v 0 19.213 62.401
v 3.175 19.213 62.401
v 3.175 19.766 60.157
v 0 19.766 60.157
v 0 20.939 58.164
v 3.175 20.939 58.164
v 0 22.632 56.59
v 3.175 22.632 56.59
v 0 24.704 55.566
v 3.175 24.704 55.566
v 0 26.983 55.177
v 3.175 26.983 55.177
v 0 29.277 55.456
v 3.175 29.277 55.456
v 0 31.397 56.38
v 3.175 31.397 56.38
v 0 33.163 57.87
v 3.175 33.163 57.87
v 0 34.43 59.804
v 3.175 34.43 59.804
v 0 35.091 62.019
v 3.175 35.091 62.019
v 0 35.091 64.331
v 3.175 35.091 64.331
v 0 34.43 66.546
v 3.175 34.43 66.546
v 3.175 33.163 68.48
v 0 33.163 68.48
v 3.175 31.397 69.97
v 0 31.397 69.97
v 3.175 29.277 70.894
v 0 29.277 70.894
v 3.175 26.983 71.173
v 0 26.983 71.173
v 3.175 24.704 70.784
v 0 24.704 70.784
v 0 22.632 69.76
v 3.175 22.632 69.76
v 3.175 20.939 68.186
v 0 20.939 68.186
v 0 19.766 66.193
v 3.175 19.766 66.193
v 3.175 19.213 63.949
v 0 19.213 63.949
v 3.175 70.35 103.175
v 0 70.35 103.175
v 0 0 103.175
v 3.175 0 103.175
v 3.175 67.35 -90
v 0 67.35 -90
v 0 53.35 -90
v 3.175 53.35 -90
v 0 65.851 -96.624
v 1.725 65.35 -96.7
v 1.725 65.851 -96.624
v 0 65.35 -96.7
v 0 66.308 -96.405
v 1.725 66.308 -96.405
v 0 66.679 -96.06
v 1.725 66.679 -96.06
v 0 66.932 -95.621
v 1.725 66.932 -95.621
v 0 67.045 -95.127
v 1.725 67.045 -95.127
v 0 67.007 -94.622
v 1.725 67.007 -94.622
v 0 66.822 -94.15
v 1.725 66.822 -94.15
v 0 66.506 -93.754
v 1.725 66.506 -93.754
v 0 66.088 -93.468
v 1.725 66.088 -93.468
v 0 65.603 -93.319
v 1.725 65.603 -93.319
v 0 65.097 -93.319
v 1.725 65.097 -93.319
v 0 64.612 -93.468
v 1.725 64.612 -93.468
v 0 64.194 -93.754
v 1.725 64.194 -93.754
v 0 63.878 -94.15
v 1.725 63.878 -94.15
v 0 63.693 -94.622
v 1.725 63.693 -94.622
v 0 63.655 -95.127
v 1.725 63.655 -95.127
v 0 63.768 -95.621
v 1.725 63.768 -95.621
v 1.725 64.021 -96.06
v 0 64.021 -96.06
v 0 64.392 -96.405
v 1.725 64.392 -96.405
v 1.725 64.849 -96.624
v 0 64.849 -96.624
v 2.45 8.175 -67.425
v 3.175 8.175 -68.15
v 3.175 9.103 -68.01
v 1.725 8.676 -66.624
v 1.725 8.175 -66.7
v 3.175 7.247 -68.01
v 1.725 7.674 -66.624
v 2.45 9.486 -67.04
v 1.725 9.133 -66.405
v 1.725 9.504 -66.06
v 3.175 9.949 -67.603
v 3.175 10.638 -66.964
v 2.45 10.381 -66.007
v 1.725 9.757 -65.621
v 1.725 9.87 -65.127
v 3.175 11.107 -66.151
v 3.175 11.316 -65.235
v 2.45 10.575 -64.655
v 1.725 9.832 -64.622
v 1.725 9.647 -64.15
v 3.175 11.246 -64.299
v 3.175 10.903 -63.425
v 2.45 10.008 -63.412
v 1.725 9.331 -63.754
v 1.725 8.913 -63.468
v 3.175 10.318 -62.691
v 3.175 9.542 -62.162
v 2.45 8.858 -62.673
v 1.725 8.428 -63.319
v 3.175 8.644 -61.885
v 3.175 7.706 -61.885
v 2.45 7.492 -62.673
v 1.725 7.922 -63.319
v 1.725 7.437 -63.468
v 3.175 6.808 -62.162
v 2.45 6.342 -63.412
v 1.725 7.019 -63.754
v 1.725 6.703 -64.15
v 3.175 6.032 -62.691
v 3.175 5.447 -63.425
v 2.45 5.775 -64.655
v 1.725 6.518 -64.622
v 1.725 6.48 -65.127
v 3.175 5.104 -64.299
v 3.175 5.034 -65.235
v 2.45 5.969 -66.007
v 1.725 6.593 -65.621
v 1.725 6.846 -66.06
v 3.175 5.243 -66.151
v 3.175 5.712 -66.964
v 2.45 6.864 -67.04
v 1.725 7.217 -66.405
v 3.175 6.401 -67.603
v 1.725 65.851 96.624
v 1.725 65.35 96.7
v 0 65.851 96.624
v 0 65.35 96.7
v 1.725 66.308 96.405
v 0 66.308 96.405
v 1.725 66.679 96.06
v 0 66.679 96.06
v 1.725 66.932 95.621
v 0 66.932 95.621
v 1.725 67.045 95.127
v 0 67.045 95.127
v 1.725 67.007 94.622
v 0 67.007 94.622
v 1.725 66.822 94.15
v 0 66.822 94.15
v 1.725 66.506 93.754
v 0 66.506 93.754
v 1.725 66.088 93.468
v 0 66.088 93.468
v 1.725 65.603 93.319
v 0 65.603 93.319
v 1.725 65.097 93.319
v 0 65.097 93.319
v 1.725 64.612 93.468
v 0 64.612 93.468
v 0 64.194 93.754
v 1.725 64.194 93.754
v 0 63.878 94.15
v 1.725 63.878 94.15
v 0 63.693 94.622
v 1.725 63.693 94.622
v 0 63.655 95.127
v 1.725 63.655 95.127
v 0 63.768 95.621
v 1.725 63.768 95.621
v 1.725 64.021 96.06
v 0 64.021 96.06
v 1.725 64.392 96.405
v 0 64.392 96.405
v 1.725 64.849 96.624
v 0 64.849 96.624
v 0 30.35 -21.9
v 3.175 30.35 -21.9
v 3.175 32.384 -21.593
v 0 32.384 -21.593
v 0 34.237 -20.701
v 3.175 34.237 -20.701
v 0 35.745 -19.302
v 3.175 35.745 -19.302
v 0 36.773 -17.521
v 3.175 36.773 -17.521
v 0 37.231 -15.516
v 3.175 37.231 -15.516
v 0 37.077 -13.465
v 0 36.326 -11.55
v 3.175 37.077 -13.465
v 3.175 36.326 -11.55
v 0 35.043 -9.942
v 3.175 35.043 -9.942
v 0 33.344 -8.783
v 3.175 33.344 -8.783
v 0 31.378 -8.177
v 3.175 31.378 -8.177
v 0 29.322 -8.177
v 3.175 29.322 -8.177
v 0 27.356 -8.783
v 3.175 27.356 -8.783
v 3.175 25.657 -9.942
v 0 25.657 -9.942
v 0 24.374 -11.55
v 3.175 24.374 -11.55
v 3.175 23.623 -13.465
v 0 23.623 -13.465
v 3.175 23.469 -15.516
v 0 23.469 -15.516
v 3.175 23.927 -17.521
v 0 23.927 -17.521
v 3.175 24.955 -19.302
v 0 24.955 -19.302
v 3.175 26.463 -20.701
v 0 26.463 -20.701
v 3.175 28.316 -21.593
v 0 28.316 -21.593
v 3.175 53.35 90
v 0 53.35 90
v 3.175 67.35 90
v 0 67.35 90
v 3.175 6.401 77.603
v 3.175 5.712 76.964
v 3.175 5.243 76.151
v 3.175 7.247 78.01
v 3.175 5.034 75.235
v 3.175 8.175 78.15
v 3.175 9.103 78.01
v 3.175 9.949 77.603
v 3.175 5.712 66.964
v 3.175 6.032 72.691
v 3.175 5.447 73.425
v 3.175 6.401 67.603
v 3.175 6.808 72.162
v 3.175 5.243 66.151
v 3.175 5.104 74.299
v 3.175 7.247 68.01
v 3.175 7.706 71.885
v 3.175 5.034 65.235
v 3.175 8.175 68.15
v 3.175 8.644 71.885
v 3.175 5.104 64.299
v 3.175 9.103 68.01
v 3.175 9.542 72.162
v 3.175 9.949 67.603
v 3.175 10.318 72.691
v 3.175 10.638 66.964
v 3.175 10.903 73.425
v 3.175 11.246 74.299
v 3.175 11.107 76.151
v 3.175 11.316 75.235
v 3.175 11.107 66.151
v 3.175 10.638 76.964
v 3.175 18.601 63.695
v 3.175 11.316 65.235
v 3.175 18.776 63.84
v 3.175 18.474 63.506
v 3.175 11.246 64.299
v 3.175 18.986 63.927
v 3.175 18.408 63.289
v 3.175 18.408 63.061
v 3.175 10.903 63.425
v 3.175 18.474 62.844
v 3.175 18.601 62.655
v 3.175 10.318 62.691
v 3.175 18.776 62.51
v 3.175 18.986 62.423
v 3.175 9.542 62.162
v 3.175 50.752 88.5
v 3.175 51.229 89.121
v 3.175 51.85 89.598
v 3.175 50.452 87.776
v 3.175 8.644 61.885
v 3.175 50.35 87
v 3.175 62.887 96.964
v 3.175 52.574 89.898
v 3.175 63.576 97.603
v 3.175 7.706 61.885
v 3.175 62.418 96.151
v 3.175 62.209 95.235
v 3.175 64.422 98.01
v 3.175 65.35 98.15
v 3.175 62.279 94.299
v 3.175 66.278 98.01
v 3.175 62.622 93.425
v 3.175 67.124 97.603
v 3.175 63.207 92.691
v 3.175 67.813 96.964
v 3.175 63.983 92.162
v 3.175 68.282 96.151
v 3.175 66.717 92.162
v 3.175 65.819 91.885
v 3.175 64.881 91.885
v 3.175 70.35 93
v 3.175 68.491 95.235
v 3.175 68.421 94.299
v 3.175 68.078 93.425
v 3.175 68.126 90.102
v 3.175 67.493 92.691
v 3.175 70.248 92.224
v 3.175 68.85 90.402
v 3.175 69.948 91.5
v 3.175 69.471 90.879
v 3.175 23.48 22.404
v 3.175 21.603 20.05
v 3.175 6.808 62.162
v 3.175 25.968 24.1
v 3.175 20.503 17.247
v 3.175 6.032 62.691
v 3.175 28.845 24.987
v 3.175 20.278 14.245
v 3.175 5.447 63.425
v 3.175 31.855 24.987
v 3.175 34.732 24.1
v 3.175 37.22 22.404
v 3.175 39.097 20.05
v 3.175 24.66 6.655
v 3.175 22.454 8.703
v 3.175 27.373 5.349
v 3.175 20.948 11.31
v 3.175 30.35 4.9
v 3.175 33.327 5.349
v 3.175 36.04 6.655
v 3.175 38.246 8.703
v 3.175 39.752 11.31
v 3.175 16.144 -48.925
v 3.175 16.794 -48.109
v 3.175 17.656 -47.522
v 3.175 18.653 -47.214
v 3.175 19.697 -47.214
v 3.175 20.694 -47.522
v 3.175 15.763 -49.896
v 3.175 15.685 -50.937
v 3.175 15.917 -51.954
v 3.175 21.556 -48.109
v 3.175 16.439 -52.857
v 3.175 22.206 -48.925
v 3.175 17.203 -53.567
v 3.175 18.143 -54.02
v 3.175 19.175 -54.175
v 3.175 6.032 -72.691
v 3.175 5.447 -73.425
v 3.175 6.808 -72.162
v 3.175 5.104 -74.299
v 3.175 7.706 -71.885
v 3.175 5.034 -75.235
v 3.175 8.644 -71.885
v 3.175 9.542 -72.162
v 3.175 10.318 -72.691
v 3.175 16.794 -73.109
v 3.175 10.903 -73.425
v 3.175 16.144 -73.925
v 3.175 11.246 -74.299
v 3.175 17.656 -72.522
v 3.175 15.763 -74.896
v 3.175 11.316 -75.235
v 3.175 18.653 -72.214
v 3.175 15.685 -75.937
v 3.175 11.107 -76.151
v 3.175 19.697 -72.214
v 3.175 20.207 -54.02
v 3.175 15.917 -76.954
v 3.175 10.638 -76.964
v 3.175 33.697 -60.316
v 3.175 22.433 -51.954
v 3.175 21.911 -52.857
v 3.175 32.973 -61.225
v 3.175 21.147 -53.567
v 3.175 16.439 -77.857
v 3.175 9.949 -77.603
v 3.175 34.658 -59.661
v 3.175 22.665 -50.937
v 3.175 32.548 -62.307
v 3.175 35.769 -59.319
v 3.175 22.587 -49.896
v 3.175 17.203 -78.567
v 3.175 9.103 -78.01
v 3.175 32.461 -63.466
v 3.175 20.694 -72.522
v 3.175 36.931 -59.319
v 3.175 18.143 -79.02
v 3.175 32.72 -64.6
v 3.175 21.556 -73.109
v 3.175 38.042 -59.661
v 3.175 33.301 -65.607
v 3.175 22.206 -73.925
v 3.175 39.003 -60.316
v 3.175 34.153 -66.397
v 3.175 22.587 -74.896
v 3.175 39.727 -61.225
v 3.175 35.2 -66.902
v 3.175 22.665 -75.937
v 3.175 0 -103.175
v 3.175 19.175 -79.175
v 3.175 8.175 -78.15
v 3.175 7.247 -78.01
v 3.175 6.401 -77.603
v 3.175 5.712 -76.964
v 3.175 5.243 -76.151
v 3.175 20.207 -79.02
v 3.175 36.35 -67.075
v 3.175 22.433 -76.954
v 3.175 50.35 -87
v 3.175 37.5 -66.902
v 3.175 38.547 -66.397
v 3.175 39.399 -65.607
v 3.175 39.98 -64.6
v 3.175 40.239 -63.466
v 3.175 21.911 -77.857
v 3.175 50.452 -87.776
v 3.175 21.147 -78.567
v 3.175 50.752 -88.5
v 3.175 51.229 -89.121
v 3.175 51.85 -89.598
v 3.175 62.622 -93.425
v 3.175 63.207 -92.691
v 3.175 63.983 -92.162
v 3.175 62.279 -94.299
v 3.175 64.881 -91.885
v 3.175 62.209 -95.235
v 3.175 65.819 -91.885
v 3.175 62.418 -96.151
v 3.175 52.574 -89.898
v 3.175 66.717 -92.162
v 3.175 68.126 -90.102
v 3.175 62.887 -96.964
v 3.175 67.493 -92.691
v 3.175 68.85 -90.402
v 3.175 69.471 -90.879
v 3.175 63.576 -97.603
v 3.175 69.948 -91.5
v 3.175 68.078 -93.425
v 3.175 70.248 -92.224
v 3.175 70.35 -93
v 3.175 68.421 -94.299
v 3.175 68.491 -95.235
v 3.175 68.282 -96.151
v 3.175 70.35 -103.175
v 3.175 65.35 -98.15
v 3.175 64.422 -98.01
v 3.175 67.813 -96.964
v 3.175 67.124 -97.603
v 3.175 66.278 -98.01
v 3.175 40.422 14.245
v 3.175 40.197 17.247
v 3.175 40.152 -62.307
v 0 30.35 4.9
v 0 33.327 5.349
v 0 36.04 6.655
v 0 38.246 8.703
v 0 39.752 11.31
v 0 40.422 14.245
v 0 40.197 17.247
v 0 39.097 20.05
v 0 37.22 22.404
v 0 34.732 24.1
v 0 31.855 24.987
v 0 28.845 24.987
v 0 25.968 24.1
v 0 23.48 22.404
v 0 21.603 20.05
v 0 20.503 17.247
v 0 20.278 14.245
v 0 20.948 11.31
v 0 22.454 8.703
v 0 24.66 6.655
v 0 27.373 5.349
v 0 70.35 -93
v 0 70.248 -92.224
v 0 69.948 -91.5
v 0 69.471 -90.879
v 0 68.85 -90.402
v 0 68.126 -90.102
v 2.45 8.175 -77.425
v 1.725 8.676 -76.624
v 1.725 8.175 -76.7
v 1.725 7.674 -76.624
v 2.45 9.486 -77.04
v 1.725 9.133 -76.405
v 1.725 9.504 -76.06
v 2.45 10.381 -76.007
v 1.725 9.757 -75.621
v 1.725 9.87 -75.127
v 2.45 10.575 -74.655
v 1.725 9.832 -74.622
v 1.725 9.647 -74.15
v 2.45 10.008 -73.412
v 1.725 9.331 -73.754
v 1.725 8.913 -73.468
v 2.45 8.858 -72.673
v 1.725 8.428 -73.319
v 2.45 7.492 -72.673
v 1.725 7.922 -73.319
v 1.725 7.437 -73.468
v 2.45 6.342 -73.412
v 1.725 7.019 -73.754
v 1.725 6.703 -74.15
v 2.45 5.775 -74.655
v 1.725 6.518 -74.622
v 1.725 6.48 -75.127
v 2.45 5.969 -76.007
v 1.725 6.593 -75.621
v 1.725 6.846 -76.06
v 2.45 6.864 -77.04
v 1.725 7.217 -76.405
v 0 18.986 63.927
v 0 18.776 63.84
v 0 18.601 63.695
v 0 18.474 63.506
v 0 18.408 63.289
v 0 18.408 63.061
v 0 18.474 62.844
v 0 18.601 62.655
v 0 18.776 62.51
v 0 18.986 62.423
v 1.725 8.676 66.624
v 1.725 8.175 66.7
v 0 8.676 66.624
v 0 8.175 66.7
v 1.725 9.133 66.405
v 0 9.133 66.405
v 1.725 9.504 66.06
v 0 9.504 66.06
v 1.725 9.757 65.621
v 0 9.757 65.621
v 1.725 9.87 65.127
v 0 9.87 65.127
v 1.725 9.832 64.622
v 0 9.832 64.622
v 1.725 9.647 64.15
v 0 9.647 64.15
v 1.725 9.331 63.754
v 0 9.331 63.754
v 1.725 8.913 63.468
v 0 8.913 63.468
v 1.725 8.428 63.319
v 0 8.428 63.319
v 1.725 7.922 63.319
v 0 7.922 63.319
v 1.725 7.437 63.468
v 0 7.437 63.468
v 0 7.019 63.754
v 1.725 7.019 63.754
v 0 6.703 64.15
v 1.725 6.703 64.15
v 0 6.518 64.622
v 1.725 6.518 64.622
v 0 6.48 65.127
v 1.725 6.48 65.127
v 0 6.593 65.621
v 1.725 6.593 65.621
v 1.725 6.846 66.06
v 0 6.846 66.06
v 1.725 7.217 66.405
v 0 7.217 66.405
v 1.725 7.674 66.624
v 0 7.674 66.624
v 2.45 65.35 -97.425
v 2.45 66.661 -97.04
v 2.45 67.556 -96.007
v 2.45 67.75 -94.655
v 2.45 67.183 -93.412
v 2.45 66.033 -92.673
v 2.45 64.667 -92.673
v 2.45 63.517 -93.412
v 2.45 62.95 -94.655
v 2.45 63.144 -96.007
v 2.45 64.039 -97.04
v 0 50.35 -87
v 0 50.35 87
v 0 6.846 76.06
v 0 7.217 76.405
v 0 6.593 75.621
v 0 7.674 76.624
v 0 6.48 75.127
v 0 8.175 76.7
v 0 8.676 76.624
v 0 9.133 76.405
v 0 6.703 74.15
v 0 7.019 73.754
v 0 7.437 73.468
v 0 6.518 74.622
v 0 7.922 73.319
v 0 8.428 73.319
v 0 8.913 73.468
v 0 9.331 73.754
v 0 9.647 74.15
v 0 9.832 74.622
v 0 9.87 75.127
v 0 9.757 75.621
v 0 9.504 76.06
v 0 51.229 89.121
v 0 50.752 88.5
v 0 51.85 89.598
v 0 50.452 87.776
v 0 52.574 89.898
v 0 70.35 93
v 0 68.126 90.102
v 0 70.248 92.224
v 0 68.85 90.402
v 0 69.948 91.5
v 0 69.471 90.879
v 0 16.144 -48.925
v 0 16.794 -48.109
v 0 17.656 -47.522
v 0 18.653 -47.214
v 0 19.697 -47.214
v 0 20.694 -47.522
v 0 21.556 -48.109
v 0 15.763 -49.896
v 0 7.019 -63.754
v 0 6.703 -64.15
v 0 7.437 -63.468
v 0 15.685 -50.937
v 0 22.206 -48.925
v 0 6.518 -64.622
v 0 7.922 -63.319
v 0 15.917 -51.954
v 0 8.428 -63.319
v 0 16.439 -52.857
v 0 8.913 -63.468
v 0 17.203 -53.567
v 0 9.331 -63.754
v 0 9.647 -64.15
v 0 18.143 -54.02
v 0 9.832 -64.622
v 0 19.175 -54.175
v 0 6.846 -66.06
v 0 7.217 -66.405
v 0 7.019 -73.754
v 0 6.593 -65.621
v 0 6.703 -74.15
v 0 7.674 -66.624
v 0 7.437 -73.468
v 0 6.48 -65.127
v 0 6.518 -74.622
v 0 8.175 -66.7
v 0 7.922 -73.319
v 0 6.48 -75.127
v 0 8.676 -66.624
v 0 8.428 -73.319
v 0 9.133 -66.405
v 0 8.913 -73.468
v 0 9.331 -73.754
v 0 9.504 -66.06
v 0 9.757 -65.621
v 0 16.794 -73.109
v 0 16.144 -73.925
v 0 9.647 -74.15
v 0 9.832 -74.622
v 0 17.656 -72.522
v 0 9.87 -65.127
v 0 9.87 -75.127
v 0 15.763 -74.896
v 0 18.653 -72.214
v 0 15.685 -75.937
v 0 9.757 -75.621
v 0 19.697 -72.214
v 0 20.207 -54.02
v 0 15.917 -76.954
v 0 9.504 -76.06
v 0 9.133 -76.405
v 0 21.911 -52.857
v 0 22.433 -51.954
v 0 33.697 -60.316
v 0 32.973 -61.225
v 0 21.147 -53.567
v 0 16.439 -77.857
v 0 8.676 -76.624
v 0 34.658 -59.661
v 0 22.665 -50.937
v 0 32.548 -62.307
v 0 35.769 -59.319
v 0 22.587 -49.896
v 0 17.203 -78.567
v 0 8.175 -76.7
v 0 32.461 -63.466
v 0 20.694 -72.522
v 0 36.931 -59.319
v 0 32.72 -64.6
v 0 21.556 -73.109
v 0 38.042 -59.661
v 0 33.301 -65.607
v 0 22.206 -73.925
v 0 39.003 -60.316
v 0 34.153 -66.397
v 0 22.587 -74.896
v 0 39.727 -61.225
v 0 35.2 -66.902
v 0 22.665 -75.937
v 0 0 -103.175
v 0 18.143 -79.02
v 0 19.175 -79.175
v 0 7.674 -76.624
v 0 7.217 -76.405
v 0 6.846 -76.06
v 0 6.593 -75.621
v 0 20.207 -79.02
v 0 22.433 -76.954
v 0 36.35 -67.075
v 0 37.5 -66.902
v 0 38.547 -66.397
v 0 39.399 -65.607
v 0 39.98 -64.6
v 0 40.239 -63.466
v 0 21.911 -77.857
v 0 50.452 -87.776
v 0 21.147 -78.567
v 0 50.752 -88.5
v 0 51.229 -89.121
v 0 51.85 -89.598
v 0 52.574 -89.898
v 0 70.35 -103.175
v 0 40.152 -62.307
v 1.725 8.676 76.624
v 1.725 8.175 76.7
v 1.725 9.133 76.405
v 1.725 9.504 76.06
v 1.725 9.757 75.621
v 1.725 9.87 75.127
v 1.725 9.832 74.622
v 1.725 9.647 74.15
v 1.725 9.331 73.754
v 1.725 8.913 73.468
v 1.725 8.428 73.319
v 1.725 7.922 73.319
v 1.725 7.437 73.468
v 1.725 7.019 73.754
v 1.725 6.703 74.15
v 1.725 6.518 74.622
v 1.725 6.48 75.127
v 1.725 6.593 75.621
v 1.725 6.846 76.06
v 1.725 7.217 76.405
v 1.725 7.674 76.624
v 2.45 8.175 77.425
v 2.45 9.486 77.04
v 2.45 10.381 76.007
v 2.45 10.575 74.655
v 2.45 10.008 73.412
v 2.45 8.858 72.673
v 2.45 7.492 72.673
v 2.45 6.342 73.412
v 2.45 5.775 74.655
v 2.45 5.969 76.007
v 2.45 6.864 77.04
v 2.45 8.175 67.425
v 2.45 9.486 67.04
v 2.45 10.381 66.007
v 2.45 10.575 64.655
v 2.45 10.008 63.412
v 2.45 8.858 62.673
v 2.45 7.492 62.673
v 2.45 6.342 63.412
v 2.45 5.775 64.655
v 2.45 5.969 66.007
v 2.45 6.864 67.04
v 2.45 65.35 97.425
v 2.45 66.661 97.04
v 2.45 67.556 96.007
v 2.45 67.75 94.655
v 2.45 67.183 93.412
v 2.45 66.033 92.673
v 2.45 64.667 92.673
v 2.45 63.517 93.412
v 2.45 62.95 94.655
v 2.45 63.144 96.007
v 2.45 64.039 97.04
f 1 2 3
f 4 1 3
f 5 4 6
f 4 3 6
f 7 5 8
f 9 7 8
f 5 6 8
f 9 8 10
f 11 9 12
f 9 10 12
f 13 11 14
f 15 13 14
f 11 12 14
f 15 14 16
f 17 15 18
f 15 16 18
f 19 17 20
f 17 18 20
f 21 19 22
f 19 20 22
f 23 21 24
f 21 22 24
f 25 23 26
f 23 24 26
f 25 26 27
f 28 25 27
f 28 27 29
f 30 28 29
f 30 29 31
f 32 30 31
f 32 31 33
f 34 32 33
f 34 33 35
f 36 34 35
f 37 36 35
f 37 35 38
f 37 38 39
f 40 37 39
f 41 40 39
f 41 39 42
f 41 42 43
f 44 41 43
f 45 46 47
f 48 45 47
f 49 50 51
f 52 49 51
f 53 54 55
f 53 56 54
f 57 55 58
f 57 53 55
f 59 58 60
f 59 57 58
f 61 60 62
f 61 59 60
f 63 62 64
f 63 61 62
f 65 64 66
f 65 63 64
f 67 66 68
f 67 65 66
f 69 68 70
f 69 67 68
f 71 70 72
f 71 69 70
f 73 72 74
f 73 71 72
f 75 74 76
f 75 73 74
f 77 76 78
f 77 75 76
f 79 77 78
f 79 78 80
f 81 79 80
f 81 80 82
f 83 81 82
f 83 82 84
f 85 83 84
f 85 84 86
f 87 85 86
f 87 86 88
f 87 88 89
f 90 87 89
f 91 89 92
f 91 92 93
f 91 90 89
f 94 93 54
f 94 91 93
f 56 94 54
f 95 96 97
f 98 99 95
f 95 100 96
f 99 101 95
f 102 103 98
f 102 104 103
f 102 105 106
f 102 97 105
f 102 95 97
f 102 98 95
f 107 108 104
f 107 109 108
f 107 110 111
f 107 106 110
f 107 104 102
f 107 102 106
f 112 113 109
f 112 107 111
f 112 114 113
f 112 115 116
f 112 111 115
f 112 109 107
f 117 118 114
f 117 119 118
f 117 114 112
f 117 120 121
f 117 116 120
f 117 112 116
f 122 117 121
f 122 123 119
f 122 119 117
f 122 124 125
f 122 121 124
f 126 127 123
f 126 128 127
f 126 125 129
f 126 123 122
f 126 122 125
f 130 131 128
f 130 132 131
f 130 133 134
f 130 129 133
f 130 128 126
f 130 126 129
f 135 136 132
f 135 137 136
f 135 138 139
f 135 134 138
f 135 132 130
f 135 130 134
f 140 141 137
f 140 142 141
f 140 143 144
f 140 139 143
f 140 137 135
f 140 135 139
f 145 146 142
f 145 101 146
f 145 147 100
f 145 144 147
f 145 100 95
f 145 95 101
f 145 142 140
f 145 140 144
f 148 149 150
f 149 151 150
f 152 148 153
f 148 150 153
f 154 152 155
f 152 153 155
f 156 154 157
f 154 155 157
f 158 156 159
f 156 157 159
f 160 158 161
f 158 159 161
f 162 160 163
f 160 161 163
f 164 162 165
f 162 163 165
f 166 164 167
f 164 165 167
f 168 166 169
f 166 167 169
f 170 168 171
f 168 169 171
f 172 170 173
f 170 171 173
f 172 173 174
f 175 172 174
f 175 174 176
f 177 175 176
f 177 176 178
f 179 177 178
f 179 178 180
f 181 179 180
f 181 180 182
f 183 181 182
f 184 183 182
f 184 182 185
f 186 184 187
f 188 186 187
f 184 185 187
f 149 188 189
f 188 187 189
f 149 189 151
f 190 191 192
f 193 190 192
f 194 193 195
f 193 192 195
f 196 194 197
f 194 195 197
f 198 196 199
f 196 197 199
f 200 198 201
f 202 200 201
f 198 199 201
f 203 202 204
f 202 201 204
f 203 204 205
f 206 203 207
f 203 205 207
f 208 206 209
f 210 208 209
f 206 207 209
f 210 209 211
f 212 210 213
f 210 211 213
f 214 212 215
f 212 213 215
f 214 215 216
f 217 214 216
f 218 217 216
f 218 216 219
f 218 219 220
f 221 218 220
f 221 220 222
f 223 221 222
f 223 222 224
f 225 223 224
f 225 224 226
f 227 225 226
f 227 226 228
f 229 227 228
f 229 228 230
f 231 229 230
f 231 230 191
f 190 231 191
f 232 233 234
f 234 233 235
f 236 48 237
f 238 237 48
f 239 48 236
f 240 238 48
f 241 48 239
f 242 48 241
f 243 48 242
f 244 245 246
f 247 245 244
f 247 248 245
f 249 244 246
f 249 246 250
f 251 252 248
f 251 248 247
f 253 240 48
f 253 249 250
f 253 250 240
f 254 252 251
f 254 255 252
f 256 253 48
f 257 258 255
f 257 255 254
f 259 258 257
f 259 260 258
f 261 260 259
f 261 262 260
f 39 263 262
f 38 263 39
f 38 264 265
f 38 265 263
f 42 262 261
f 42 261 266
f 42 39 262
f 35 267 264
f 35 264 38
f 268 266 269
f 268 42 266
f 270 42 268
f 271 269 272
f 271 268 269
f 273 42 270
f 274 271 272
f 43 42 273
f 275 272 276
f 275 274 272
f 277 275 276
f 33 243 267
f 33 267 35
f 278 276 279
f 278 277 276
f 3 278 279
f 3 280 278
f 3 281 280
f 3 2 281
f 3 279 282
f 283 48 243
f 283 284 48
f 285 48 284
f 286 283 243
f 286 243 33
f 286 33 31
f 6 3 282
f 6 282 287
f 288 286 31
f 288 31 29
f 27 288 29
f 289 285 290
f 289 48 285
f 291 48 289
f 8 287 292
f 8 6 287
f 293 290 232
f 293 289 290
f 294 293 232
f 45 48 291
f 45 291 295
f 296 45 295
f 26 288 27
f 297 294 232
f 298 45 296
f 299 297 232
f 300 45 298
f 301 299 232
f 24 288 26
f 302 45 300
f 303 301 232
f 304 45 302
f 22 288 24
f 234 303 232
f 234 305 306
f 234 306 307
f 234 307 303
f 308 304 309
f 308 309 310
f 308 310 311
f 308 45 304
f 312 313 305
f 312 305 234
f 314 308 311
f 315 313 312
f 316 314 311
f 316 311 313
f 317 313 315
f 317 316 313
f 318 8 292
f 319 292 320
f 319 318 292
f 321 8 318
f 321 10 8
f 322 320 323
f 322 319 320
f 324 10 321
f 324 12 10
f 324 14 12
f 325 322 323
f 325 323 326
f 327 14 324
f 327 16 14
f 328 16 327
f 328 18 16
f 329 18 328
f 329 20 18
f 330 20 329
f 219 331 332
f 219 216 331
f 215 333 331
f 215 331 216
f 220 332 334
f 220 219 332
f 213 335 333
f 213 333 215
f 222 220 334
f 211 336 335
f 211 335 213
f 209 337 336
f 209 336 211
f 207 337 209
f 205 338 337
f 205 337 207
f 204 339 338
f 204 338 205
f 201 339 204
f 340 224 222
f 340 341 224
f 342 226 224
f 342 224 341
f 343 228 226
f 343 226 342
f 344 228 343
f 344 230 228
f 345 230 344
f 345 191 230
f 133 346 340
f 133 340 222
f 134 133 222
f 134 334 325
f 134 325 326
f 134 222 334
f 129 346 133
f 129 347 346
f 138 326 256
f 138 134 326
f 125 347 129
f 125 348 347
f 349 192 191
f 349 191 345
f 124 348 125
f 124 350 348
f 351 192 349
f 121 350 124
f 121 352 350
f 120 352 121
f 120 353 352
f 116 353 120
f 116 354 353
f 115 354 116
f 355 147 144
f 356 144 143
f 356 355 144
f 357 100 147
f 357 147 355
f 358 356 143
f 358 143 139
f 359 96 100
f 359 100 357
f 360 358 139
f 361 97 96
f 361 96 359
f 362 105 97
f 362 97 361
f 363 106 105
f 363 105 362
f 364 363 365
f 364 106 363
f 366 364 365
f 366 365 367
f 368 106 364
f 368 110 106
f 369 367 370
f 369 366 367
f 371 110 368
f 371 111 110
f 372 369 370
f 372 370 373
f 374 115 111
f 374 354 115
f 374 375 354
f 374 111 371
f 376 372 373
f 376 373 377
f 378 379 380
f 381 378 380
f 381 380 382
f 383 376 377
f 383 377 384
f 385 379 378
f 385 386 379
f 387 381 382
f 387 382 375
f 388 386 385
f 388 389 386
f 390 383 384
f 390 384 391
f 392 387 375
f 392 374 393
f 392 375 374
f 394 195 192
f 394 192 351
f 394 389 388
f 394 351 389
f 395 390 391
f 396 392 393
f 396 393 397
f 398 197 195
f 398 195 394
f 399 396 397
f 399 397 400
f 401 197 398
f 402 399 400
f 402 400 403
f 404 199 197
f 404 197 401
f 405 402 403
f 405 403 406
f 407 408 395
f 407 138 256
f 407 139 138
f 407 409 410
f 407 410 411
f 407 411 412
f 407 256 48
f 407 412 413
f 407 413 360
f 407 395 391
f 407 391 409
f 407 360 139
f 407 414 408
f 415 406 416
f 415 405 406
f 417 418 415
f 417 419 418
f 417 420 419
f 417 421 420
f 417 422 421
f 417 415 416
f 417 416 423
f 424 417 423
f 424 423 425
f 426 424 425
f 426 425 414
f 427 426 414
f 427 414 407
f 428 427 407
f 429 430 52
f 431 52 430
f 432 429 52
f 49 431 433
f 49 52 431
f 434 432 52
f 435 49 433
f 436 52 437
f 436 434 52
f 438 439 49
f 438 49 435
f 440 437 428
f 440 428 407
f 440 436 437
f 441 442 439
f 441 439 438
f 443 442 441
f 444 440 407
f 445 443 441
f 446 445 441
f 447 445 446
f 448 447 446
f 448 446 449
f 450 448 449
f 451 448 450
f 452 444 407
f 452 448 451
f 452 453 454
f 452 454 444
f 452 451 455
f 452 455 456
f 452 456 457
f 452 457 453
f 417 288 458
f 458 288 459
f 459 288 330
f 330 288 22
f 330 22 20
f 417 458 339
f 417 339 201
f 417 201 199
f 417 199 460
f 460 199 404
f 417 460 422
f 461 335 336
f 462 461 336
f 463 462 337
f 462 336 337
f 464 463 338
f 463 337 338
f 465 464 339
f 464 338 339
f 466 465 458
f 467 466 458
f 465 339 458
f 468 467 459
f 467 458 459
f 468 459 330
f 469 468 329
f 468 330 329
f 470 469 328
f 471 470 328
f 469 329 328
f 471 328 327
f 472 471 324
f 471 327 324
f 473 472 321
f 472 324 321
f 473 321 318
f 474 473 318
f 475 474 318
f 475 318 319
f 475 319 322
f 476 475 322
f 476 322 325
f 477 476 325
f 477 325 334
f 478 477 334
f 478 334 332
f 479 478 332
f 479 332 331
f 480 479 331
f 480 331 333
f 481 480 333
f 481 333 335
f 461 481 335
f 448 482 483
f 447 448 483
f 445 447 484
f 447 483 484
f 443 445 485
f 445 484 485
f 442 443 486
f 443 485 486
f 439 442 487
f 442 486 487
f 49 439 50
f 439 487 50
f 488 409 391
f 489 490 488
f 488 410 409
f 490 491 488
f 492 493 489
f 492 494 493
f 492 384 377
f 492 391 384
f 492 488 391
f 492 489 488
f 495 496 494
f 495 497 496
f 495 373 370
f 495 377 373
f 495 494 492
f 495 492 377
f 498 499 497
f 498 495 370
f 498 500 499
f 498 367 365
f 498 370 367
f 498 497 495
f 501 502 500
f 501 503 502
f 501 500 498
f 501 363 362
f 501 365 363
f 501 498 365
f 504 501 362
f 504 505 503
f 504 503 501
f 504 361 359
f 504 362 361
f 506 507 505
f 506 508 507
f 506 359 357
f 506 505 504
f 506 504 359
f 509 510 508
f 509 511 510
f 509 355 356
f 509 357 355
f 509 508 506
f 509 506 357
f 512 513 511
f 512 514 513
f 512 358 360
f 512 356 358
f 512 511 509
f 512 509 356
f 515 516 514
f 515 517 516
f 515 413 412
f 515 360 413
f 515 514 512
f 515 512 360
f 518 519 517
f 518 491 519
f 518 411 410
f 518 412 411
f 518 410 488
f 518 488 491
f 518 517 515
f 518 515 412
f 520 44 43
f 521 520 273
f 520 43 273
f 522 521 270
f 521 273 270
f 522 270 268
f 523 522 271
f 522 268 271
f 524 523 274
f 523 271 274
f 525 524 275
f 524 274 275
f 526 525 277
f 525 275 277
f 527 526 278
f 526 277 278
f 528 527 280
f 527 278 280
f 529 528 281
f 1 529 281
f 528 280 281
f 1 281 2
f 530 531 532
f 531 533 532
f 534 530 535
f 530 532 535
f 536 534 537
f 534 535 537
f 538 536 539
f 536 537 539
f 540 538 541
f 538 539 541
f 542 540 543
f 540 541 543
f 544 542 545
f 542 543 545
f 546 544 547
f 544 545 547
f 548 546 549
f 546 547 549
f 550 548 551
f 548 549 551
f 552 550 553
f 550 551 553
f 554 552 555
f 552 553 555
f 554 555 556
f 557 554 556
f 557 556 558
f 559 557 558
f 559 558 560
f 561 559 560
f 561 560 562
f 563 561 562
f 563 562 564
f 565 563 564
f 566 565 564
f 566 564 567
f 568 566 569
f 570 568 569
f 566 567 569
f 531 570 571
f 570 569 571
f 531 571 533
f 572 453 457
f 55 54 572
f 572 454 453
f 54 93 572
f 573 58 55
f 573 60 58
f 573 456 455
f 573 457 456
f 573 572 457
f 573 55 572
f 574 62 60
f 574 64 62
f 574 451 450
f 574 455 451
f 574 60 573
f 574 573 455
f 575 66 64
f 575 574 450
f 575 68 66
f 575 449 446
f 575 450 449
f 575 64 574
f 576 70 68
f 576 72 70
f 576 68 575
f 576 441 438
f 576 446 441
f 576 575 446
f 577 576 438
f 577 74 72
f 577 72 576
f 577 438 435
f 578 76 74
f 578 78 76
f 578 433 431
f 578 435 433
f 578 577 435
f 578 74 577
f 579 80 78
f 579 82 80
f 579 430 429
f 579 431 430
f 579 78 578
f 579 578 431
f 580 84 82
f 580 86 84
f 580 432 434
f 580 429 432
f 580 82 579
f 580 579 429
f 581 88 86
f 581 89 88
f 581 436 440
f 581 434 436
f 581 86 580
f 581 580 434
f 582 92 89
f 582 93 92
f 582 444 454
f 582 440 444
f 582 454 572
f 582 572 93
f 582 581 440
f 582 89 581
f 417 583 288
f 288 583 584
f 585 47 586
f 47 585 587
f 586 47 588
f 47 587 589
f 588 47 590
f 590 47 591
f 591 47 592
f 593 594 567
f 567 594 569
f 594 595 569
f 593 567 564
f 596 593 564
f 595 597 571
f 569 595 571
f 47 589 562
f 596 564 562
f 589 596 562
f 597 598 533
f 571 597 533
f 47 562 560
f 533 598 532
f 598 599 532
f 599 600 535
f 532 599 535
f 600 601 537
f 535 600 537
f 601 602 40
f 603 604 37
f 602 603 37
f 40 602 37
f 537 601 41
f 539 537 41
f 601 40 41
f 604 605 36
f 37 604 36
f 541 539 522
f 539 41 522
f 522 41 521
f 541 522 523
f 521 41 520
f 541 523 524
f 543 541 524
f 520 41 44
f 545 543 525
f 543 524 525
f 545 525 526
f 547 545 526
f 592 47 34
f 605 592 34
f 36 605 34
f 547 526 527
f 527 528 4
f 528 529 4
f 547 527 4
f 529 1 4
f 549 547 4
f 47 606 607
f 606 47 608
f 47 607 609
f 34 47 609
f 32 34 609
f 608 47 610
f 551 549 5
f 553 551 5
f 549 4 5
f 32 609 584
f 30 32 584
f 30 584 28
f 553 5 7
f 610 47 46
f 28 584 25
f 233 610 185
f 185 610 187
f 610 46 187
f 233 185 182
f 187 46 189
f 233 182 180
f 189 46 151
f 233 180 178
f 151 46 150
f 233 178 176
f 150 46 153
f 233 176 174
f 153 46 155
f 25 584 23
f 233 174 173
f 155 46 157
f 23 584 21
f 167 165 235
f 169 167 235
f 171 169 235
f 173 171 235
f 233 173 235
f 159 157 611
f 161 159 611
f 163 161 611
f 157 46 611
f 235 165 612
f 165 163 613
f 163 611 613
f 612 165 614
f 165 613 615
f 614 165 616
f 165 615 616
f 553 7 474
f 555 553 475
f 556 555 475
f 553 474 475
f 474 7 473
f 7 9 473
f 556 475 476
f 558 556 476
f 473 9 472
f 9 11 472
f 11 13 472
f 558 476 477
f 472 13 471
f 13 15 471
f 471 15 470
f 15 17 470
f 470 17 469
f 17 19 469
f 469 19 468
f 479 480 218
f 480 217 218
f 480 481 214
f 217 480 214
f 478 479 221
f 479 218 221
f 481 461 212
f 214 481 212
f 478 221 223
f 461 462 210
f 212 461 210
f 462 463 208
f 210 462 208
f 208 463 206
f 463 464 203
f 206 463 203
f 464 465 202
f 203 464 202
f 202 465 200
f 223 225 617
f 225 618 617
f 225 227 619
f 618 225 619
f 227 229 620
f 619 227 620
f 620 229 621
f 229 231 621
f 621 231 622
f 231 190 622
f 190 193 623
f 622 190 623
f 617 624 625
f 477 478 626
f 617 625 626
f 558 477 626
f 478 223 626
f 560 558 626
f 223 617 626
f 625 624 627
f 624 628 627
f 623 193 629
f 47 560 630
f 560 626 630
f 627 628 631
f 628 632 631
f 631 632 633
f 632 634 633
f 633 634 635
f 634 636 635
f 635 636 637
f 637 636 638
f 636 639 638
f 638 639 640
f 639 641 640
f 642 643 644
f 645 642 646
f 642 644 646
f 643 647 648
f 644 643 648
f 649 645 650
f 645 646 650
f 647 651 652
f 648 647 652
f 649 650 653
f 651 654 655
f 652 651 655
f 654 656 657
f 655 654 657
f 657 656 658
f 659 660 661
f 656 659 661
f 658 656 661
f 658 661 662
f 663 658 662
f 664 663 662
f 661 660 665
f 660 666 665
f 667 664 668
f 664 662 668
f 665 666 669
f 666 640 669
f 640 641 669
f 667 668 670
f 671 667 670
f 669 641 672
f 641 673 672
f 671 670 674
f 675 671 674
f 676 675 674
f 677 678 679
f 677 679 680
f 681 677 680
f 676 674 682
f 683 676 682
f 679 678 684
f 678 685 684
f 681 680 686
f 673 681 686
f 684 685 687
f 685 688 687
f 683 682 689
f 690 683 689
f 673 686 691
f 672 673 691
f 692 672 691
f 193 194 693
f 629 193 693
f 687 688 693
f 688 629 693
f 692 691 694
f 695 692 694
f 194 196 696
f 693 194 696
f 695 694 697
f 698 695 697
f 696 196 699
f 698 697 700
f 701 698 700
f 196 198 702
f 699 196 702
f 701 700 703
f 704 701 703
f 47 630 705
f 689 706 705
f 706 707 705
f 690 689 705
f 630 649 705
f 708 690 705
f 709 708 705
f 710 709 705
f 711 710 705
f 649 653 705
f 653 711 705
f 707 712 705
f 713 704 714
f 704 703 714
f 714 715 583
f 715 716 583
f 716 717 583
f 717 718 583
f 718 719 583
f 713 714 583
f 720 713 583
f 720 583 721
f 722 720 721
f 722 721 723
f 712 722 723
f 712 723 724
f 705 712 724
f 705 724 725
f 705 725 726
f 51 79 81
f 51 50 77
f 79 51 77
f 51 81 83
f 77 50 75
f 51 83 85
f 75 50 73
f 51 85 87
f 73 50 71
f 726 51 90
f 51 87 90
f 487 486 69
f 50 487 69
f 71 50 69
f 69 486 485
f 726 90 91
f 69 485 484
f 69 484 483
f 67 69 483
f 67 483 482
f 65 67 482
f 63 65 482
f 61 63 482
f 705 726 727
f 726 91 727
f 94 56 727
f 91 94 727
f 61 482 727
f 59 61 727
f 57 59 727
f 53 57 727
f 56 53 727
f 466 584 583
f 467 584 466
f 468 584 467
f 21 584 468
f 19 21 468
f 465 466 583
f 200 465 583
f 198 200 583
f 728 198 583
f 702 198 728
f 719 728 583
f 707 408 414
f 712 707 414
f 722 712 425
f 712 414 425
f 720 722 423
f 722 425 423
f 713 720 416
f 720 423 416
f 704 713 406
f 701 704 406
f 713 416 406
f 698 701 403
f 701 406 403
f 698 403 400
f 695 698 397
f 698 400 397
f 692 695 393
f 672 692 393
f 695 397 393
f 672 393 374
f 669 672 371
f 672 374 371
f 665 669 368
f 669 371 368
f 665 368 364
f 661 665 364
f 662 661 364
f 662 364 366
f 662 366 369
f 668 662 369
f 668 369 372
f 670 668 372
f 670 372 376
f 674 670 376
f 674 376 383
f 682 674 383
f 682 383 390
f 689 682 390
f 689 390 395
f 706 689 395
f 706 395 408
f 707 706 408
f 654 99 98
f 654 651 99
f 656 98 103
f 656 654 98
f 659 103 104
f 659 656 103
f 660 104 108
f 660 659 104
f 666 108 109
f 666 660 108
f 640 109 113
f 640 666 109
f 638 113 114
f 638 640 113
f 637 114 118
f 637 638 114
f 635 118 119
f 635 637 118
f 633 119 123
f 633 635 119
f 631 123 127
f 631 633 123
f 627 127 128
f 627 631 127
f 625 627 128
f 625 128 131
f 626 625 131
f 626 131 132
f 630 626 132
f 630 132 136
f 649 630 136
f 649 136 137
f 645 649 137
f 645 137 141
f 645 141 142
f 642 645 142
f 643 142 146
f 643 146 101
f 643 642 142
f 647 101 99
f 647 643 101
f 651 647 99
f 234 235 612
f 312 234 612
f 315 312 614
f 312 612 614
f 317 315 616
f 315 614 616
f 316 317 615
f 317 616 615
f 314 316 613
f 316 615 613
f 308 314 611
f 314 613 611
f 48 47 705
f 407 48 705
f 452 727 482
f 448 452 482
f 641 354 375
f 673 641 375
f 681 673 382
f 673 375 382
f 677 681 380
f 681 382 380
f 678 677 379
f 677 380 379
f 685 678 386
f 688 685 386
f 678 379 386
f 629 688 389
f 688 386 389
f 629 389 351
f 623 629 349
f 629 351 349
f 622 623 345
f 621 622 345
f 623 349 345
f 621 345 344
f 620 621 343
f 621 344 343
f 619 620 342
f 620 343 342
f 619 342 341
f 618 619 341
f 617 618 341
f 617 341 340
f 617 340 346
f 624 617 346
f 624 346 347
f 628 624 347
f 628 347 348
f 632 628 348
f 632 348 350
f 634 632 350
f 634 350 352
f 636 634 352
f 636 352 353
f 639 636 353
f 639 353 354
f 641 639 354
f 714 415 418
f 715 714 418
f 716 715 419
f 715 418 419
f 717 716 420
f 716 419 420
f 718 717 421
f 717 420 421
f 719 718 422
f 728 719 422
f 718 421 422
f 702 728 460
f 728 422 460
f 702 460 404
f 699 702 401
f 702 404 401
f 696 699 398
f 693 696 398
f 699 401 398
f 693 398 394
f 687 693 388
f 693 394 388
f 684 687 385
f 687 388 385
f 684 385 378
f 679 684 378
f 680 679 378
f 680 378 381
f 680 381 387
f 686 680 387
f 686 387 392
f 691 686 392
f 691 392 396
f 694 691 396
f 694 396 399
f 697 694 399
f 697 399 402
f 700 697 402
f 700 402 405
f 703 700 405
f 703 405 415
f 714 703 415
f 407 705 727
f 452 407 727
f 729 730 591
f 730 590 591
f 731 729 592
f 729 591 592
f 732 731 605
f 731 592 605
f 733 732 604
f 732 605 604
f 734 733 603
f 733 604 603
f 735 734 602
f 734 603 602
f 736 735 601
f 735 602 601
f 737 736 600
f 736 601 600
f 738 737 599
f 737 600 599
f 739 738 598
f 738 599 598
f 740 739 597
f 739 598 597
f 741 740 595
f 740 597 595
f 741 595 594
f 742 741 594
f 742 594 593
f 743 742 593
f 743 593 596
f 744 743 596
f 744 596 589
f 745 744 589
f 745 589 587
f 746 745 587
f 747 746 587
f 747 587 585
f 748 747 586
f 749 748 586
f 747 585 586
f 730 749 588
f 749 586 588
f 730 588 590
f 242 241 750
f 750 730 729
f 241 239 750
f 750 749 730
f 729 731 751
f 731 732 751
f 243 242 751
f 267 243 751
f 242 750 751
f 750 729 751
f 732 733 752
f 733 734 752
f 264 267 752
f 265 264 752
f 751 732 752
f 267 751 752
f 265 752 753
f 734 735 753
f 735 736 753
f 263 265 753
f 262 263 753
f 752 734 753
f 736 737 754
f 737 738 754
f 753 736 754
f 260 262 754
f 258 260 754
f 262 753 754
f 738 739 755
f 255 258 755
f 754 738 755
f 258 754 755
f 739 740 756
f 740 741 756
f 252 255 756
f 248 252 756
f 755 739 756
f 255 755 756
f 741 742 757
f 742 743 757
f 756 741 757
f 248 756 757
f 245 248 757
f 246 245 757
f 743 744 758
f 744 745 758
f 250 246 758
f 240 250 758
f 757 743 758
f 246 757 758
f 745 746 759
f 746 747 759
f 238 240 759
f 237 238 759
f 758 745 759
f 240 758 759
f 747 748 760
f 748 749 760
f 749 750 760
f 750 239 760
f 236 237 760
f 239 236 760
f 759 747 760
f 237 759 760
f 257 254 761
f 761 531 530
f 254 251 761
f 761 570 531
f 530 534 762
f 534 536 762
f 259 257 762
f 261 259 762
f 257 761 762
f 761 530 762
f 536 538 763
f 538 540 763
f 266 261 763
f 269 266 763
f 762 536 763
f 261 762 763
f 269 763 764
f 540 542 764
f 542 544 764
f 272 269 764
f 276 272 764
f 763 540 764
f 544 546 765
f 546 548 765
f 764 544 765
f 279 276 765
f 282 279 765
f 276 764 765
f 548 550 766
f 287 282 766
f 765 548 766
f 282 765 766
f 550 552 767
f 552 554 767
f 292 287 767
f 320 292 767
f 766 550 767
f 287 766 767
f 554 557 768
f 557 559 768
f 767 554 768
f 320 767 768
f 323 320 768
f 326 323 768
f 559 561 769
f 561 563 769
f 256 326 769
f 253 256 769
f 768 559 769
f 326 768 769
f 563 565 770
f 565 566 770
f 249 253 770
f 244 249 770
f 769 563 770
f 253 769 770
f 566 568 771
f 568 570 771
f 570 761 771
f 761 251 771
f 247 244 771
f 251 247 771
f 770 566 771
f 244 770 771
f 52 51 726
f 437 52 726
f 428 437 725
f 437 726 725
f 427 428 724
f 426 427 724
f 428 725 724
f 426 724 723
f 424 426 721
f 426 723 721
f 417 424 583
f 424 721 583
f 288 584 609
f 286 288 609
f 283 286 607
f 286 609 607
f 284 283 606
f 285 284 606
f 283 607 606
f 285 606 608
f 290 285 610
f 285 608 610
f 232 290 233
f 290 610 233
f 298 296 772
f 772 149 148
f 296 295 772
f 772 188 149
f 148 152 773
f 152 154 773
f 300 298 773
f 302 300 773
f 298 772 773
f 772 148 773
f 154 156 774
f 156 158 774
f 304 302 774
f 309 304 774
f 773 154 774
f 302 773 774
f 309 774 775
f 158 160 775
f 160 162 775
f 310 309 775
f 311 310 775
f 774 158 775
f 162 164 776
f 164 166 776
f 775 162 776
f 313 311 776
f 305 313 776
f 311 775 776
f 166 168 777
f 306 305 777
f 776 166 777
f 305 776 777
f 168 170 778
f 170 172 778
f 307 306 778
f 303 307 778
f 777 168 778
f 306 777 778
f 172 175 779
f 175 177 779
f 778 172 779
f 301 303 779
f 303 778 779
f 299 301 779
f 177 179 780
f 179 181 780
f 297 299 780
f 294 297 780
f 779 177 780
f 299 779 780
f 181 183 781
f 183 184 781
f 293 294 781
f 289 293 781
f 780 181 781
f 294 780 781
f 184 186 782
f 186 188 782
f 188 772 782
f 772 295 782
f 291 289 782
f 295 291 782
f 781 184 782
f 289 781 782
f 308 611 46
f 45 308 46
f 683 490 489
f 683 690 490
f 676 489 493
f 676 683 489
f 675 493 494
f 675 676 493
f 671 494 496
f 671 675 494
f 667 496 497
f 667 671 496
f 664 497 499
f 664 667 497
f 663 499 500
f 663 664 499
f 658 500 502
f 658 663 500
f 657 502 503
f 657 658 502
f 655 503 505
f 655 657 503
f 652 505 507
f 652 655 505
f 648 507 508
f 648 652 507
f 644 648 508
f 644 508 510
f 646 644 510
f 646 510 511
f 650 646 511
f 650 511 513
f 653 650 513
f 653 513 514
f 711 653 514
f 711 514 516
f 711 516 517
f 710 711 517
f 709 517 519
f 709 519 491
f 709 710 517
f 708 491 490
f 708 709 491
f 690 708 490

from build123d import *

# Parameters (mm, degrees)
BOSS_EXTRUDE1_DEPTH                             = 3.175
CSK_FOR_M3_FLAT_HEAD_MACHINE_SCREW1_D           = 3.4
CSK_FOR_M3_FLAT_HEAD_MACHINE_SCREW1_CSINK_D     = 6.3
CSK_FOR_M3_FLAT_HEAD_MACHINE_SCREW1_CSINK_ANGLE = 90
SKETCH4_R                                       = 6.9
SKETCH4_R_2                                     = 3.9
SKETCH4_R_3                                     = 3.5
SKETCH4_R_4                                     = 10.1
CUT_EXTRUDE1_DEPTH                              = 4.175


with BuildPart() as part:
    # Sketch1 → Boss-Extrude1 (new body)
    with BuildSketch(Plane(origin=(0, 0, 0), x_dir=(0, 0, -1), z_dir=(1, 0, 0))):
        with BuildLine():
            Line((103.175, 0), (103.175, 3.175))
            Line((103.175, 3.175), (103.175, 47.175))
            Line((103.175, 47.175), (103.175, 50.35))
            Line((103.175, 50.35), (103.175, 70.35))
            Line((103.175, 70.35), (93, 70.35))
            ThreePointArc((93, 70.35), (90.878679656, 69.471320344), (90, 67.35))
            Line((90, 67.35), (90, 53.35))
            ThreePointArc((90, 53.35), (89.121320344, 51.228679656), (87, 50.35))
            Line((87, 50.35), (-87, 50.35))
            ThreePointArc((-87, 50.35), (-89.121320344, 51.228679656), (-90, 53.35))
            Line((-90, 53.35), (-90, 67.35))
            ThreePointArc((-90, 67.35), (-90.878679656, 69.471320344), (-93, 70.35))
            Line((-93, 70.35), (-103.175, 70.35))
            Line((-103.175, 70.35), (-103.175, 50.35))
            Line((-103.175, 50.35), (-103.175, 47.175))
            Line((-103.175, 47.175), (-103.175, 3.175))
            Line((-103.175, 3.175), (-103.175, 0))
            Line((-103.175, 0), (103.175, 0))
        make_face()
    extrude(amount=BOSS_EXTRUDE1_DEPTH)

    # CSK for M3 Flat Head Machine Screw1 (through all)
    with Locations(Plane(origin=(3.175, 0, 0), x_dir=(0, 0, -1), z_dir=(1, 0, 0))):
        with Locations((-75, 8.175), (-65, 8.175), (-95, 65.35)):
            csk_for_m3_flat_head_machine_screw1 = CounterSinkHole(CSK_FOR_M3_FLAT_HEAD_MACHINE_SCREW1_D / 2, CSK_FOR_M3_FLAT_HEAD_MACHINE_SCREW1_CSINK_D / 2, counter_sink_angle=CSK_FOR_M3_FLAT_HEAD_MACHINE_SCREW1_CSINK_ANGLE)

    # Mirror1: CSK for M3 Flat Head Machine Screw1 across plane
    add(csk_for_m3_flat_head_machine_screw1.mirror(Plane.XY), mode=Mode.SUBTRACT)

    # Sketch4 → Cut-Extrude1 (cut, through all)
    with BuildSketch(Plane(origin=(3.175, 0, 0), x_dir=(0, 0, -1), z_dir=(1, 0, 0))):
        with Locations((15, 30.35)):
            Circle(SKETCH4_R)
        with Locations((63.175, 36.35)):
            Circle(SKETCH4_R_2)
        with Locations((50.675, 19.175)):
            Circle(SKETCH4_R_3)
        with Locations((75.675, 19.175)):
            Circle(SKETCH4_R_3)
        with Locations((-15, 30.35)):
            Circle(SKETCH4_R_4)
        with BuildLine():
            ThreePointArc((-62.400909683, 19.212539062), (-63.175, 35.175), (-63.949090317, 19.212539062))
            ThreePointArc((-63.949090317, 19.212539062), (-63.175, 18.4), (-62.400909683, 19.212539062))
        make_face()
    extrude(amount=-CUT_EXTRUDE1_DEPTH, mode=Mode.SUBTRACT)


solid = part.part
